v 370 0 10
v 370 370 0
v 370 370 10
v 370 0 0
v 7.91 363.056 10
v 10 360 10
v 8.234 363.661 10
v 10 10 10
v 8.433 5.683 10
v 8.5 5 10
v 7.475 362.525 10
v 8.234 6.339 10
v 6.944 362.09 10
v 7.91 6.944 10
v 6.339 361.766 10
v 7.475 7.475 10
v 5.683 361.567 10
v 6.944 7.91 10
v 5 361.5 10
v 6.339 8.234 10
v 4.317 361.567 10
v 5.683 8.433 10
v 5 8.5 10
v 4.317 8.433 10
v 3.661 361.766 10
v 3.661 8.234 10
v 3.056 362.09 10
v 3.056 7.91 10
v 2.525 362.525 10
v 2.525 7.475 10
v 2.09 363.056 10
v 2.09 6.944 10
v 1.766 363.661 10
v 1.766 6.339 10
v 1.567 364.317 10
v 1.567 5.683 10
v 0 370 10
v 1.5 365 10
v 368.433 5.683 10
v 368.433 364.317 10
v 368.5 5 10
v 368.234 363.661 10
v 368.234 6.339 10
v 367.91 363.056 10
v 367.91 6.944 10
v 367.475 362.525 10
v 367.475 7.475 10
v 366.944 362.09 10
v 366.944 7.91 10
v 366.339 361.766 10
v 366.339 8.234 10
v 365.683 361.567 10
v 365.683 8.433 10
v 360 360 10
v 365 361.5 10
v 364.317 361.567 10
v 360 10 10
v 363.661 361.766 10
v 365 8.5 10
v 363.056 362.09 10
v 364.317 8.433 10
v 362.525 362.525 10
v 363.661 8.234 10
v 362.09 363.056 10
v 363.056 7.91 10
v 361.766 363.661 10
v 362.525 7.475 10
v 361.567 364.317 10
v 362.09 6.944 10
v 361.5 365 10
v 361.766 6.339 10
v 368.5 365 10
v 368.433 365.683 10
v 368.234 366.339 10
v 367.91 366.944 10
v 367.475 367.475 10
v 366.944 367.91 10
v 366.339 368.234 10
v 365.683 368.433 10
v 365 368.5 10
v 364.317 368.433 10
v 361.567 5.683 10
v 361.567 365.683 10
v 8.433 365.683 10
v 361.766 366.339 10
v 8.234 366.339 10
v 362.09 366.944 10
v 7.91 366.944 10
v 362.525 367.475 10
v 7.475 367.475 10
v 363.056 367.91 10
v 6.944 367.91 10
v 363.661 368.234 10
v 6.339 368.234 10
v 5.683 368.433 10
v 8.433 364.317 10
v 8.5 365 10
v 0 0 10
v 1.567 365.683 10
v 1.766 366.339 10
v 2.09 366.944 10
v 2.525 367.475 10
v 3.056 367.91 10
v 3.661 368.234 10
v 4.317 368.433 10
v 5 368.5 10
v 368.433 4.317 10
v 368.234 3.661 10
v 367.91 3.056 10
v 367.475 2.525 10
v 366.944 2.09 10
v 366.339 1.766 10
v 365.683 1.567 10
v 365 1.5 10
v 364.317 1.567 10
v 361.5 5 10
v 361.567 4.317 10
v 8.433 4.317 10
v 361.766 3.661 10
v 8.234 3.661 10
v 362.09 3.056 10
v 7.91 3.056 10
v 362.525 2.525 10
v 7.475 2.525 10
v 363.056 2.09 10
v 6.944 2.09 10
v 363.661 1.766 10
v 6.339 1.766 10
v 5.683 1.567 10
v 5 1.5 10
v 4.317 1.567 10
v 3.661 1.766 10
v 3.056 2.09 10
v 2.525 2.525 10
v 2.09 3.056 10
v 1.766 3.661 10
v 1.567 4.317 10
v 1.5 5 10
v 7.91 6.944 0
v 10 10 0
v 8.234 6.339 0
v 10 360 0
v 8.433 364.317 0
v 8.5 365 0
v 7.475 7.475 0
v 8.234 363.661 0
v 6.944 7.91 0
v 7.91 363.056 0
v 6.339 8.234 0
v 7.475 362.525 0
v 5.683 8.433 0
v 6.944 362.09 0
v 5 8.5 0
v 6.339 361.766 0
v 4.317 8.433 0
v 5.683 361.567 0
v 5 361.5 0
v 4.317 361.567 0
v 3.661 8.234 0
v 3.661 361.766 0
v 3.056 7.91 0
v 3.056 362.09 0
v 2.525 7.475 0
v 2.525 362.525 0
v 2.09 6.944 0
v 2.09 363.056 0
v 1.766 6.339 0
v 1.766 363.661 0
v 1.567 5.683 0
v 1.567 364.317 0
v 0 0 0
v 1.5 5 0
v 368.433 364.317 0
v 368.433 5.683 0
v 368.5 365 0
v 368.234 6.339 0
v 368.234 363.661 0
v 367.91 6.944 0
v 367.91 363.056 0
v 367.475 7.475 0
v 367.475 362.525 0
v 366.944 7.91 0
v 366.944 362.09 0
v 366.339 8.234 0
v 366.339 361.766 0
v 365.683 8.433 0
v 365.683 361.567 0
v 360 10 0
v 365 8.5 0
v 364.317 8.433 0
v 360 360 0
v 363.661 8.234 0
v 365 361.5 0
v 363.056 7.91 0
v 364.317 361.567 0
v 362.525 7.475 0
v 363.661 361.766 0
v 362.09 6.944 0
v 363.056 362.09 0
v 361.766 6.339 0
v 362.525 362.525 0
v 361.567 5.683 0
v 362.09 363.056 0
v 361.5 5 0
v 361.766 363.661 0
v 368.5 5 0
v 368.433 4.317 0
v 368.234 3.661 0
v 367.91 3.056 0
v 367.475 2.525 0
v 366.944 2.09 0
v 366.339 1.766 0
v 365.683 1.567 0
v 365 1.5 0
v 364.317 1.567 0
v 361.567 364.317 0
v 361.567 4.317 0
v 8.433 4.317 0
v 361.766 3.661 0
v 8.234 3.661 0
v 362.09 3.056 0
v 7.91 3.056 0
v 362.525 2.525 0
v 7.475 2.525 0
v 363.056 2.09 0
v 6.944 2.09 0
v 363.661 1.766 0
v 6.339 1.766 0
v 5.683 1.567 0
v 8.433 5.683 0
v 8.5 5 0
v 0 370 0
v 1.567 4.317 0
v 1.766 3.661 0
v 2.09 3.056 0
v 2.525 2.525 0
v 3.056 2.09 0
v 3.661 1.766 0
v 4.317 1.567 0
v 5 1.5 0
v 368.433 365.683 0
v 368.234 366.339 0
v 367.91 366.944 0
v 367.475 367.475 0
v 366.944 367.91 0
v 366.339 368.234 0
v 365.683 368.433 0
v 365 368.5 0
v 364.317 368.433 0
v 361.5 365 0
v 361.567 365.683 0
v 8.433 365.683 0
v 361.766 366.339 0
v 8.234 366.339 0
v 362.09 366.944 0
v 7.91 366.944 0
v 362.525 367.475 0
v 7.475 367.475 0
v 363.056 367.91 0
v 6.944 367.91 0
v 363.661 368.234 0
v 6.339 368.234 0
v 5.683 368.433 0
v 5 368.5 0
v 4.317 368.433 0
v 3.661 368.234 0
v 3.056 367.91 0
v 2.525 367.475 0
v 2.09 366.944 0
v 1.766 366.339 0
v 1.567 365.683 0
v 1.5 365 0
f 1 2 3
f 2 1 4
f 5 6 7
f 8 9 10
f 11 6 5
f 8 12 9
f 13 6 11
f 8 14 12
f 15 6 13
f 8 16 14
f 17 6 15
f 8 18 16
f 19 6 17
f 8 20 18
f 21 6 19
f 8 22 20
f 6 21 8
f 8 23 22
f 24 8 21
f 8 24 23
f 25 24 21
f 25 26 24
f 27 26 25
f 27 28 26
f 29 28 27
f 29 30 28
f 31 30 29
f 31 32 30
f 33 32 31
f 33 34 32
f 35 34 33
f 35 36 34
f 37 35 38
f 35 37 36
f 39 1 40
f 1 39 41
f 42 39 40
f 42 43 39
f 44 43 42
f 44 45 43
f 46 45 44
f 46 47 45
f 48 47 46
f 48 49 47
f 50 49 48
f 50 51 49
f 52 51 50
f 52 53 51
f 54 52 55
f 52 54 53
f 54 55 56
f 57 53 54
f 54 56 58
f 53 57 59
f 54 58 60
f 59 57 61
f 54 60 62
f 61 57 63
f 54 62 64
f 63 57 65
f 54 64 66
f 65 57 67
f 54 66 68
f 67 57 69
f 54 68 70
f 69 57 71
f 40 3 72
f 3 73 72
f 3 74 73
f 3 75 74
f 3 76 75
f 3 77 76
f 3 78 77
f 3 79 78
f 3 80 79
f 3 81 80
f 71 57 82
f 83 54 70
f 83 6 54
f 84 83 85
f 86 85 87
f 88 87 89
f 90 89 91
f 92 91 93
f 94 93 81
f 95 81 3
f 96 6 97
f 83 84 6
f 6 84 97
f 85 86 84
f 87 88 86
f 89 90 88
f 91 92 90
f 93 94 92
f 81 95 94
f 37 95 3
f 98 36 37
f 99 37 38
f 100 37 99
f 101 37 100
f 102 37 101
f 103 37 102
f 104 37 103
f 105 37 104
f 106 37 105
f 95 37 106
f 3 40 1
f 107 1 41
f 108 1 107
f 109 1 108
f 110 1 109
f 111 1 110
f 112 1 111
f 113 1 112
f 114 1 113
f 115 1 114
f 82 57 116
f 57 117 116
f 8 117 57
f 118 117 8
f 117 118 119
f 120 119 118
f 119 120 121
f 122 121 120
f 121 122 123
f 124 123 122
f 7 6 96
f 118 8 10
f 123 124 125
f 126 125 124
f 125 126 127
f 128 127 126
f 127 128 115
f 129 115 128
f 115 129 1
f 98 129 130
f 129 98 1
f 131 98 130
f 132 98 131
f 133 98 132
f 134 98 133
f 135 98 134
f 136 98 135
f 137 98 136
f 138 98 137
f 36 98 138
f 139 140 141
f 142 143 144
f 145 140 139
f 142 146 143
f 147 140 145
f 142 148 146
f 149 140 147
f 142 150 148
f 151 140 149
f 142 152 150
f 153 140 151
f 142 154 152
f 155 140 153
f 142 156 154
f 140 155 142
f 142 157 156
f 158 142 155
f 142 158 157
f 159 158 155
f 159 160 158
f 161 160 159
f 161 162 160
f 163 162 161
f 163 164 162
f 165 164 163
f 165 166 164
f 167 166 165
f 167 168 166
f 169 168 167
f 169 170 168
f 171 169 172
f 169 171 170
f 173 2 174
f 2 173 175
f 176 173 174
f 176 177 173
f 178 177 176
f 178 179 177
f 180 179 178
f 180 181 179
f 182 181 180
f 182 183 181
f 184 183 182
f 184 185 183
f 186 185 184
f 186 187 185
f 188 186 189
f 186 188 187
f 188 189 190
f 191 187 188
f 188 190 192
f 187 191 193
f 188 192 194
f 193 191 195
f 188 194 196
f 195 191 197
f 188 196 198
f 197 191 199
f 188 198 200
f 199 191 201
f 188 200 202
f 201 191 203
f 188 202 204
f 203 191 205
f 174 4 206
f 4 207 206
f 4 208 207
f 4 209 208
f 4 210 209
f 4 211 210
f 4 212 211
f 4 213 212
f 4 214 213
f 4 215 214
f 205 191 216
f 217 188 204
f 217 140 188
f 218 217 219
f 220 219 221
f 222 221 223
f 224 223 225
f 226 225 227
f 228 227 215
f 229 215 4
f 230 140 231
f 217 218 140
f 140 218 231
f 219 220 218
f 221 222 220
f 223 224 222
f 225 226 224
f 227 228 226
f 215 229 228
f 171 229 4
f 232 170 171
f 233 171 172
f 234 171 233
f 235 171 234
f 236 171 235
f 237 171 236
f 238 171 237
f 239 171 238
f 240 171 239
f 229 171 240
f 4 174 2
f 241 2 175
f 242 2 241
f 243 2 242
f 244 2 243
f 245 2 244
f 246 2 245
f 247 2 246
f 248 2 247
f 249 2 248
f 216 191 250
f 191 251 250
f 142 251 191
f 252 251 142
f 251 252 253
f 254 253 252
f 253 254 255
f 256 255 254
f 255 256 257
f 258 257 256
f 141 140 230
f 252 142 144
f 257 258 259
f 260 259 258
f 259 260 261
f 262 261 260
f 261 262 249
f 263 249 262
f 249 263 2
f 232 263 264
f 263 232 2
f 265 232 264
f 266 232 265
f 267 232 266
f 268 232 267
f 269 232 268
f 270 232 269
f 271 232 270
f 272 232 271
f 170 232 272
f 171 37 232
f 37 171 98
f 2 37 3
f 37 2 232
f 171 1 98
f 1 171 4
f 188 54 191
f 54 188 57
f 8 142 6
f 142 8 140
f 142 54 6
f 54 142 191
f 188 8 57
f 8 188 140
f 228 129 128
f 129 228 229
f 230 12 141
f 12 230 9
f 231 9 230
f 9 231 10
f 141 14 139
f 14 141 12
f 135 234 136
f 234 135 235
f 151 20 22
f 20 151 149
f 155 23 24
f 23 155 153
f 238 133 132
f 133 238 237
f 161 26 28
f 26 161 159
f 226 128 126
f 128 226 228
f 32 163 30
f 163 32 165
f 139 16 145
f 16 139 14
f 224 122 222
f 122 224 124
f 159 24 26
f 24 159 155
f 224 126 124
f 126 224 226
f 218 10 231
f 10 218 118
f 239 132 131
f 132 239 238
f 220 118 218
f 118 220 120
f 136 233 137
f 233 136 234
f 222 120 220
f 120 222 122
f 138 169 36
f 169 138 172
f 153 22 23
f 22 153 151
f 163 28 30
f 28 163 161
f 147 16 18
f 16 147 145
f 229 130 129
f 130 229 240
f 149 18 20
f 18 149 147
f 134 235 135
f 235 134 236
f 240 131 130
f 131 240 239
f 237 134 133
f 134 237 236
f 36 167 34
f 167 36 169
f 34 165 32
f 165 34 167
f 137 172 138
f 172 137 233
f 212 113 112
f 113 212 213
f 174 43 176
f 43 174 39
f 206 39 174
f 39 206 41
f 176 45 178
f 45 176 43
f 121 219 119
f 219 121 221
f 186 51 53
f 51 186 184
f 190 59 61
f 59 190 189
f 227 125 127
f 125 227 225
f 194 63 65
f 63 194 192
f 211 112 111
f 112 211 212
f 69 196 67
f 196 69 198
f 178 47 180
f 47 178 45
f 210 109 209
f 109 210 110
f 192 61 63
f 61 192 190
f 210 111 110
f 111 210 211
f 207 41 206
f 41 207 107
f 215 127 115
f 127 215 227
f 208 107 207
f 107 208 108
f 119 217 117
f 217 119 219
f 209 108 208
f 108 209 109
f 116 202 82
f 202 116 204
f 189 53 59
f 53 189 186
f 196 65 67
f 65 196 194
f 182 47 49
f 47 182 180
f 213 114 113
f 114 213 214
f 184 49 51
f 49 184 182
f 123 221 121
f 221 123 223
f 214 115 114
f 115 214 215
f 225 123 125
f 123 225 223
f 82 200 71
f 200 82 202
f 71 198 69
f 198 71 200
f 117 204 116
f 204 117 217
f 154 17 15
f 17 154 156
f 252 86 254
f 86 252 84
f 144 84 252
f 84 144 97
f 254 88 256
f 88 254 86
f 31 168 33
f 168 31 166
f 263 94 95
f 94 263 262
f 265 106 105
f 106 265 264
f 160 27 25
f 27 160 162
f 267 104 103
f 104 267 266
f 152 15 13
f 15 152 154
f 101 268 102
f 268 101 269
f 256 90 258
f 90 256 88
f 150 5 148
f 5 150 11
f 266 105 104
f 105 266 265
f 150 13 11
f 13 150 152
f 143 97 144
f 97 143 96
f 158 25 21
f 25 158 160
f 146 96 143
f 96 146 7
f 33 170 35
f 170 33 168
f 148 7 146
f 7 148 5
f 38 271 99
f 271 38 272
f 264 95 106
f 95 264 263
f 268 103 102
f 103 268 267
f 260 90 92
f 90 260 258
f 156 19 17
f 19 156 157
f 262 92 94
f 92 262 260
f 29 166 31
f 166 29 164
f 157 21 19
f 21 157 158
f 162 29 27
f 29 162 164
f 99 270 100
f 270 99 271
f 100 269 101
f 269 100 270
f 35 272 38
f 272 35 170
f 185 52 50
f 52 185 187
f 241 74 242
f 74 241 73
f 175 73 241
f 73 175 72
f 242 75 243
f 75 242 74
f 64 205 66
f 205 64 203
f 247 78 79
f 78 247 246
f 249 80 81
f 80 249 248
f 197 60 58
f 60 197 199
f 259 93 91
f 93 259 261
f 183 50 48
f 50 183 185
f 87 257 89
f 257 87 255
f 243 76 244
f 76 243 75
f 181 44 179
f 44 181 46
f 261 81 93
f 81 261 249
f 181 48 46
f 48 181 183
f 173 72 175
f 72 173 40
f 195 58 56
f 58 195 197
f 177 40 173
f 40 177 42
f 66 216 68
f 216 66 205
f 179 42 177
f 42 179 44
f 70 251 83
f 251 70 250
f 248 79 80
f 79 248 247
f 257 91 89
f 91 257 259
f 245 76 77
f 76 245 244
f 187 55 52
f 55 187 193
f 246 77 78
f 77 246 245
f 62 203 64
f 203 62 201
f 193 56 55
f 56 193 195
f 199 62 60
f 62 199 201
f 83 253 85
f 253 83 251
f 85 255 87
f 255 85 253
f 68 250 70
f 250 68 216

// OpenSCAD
bar=10;ext=370;int_size=350;h_bar_h=10;m6_d=7;positions=[0,80,150,220,290,360];difference(){difference(){cube([ext,ext,h_bar_h]);translate([bar,bar,-1])cube([int_size,int_size,h_bar_h+2]);}translate([5,5,-1])cylinder(h=100,d=m6_d,$fn=32);translate([365,5,-1])cylinder(h=100,d=m6_d,$fn=32);translate([5,365,-1])cylinder(h=100,d=m6_d,$fn=32);translate([365,365,-1])cylinder(h=100,d=m6_d,$fn=32);}
